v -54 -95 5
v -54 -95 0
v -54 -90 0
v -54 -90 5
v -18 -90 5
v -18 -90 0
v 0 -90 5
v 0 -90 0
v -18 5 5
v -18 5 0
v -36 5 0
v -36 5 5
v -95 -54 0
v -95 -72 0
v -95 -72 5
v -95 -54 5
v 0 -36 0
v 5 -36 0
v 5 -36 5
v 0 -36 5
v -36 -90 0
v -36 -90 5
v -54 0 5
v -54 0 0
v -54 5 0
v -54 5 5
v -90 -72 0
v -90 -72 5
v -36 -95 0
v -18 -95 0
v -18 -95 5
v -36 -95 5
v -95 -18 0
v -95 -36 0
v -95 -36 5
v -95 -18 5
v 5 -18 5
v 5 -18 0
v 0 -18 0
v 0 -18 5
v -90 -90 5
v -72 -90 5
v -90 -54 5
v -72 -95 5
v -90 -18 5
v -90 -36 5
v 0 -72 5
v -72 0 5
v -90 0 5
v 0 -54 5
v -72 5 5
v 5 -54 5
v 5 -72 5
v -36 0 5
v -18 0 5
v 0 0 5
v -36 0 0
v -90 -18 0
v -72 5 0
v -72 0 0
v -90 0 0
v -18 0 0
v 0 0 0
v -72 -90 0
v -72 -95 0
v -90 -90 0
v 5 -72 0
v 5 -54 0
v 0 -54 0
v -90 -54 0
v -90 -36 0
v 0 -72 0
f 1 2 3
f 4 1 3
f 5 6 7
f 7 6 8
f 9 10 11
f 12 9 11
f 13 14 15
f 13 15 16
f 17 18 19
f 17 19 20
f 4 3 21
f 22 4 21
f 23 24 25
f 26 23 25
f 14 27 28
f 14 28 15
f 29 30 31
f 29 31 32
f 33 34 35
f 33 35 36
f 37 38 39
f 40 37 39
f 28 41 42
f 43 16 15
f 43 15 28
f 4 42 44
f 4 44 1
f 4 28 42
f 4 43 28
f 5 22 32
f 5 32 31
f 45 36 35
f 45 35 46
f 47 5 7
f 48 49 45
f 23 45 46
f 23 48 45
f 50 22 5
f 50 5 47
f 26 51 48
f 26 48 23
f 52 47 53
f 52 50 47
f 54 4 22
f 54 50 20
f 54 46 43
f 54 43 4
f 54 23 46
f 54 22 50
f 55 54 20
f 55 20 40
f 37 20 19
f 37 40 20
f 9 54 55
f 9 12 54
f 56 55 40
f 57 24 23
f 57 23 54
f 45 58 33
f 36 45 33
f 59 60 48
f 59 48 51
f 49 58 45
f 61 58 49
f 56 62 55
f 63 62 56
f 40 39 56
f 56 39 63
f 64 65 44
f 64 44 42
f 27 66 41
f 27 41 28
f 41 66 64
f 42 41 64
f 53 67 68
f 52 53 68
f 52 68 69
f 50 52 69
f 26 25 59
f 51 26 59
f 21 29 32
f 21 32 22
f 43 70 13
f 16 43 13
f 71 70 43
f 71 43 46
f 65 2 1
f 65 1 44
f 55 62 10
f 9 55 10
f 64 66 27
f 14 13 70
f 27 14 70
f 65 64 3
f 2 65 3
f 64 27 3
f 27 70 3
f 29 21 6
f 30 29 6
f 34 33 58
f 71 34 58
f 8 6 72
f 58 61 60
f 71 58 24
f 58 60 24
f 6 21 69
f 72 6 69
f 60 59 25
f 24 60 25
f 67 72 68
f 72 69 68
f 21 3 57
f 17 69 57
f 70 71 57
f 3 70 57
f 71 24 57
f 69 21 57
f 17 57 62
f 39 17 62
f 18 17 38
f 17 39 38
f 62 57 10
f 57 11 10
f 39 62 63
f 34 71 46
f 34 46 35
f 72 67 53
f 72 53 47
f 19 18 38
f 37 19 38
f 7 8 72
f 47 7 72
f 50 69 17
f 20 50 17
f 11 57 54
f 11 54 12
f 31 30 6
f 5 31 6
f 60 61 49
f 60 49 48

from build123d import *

# Parameters (mm, degrees)
ESQUISSE1_W        = 90
ESQUISSE1_H        = 90
BOSS_EXTRU_1_DEPTH = 5
ESQUISSE2_W        = 5
ESQUISSE2_H        = 18
BOSS_EXTRU_2_DEPTH = 5
ESQUISSE3_W        = 18
ESQUISSE3_H        = 5
BOSS_EXTRU_3_DEPTH = 5


with BuildPart() as part:
    # Esquisse1 → Boss.-Extru.1 (new body)
    with BuildSketch(Plane.XY):
        with Locations((-45, -45)):
            Rectangle(ESQUISSE1_W, ESQUISSE1_H)
    extrude(amount=BOSS_EXTRU_1_DEPTH)

    # Esquisse2 → Boss.-Extru.2 (add)
    with BuildSketch(Plane(origin=(0, 0, 0), x_dir=(-1, 0, 0), z_dir=(0, 0, -1))):
        with Locations((-2.5, -27)):
            Rectangle(ESQUISSE2_W, ESQUISSE2_H)
        with Locations((-2.5, -63)):
            Rectangle(ESQUISSE2_W, ESQUISSE2_H)
        with Locations((92.5, -63)):
            Rectangle(ESQUISSE2_W, ESQUISSE2_H)
        with Locations((92.5, -27)):
            Rectangle(ESQUISSE2_W, ESQUISSE2_H)
    extrude(amount=-BOSS_EXTRU_2_DEPTH)

    # Esquisse3 → Boss.-Extru.3 (add)
    with BuildSketch(Plane(origin=(0, 0, 0), x_dir=(-1, 0, 0), z_dir=(0, 0, -1))):
        with Locations((27, 2.5)):
            Rectangle(ESQUISSE3_W, ESQUISSE3_H)
        with Locations((63, 2.5)):
            Rectangle(ESQUISSE3_W, ESQUISSE3_H)
        with Locations((63, -92.5)):
            Rectangle(ESQUISSE3_W, ESQUISSE3_H)
        with Locations((27, -92.5)):
            Rectangle(ESQUISSE3_W, ESQUISSE3_H)
    extrude(amount=-BOSS_EXTRU_3_DEPTH)


solid = part.part
